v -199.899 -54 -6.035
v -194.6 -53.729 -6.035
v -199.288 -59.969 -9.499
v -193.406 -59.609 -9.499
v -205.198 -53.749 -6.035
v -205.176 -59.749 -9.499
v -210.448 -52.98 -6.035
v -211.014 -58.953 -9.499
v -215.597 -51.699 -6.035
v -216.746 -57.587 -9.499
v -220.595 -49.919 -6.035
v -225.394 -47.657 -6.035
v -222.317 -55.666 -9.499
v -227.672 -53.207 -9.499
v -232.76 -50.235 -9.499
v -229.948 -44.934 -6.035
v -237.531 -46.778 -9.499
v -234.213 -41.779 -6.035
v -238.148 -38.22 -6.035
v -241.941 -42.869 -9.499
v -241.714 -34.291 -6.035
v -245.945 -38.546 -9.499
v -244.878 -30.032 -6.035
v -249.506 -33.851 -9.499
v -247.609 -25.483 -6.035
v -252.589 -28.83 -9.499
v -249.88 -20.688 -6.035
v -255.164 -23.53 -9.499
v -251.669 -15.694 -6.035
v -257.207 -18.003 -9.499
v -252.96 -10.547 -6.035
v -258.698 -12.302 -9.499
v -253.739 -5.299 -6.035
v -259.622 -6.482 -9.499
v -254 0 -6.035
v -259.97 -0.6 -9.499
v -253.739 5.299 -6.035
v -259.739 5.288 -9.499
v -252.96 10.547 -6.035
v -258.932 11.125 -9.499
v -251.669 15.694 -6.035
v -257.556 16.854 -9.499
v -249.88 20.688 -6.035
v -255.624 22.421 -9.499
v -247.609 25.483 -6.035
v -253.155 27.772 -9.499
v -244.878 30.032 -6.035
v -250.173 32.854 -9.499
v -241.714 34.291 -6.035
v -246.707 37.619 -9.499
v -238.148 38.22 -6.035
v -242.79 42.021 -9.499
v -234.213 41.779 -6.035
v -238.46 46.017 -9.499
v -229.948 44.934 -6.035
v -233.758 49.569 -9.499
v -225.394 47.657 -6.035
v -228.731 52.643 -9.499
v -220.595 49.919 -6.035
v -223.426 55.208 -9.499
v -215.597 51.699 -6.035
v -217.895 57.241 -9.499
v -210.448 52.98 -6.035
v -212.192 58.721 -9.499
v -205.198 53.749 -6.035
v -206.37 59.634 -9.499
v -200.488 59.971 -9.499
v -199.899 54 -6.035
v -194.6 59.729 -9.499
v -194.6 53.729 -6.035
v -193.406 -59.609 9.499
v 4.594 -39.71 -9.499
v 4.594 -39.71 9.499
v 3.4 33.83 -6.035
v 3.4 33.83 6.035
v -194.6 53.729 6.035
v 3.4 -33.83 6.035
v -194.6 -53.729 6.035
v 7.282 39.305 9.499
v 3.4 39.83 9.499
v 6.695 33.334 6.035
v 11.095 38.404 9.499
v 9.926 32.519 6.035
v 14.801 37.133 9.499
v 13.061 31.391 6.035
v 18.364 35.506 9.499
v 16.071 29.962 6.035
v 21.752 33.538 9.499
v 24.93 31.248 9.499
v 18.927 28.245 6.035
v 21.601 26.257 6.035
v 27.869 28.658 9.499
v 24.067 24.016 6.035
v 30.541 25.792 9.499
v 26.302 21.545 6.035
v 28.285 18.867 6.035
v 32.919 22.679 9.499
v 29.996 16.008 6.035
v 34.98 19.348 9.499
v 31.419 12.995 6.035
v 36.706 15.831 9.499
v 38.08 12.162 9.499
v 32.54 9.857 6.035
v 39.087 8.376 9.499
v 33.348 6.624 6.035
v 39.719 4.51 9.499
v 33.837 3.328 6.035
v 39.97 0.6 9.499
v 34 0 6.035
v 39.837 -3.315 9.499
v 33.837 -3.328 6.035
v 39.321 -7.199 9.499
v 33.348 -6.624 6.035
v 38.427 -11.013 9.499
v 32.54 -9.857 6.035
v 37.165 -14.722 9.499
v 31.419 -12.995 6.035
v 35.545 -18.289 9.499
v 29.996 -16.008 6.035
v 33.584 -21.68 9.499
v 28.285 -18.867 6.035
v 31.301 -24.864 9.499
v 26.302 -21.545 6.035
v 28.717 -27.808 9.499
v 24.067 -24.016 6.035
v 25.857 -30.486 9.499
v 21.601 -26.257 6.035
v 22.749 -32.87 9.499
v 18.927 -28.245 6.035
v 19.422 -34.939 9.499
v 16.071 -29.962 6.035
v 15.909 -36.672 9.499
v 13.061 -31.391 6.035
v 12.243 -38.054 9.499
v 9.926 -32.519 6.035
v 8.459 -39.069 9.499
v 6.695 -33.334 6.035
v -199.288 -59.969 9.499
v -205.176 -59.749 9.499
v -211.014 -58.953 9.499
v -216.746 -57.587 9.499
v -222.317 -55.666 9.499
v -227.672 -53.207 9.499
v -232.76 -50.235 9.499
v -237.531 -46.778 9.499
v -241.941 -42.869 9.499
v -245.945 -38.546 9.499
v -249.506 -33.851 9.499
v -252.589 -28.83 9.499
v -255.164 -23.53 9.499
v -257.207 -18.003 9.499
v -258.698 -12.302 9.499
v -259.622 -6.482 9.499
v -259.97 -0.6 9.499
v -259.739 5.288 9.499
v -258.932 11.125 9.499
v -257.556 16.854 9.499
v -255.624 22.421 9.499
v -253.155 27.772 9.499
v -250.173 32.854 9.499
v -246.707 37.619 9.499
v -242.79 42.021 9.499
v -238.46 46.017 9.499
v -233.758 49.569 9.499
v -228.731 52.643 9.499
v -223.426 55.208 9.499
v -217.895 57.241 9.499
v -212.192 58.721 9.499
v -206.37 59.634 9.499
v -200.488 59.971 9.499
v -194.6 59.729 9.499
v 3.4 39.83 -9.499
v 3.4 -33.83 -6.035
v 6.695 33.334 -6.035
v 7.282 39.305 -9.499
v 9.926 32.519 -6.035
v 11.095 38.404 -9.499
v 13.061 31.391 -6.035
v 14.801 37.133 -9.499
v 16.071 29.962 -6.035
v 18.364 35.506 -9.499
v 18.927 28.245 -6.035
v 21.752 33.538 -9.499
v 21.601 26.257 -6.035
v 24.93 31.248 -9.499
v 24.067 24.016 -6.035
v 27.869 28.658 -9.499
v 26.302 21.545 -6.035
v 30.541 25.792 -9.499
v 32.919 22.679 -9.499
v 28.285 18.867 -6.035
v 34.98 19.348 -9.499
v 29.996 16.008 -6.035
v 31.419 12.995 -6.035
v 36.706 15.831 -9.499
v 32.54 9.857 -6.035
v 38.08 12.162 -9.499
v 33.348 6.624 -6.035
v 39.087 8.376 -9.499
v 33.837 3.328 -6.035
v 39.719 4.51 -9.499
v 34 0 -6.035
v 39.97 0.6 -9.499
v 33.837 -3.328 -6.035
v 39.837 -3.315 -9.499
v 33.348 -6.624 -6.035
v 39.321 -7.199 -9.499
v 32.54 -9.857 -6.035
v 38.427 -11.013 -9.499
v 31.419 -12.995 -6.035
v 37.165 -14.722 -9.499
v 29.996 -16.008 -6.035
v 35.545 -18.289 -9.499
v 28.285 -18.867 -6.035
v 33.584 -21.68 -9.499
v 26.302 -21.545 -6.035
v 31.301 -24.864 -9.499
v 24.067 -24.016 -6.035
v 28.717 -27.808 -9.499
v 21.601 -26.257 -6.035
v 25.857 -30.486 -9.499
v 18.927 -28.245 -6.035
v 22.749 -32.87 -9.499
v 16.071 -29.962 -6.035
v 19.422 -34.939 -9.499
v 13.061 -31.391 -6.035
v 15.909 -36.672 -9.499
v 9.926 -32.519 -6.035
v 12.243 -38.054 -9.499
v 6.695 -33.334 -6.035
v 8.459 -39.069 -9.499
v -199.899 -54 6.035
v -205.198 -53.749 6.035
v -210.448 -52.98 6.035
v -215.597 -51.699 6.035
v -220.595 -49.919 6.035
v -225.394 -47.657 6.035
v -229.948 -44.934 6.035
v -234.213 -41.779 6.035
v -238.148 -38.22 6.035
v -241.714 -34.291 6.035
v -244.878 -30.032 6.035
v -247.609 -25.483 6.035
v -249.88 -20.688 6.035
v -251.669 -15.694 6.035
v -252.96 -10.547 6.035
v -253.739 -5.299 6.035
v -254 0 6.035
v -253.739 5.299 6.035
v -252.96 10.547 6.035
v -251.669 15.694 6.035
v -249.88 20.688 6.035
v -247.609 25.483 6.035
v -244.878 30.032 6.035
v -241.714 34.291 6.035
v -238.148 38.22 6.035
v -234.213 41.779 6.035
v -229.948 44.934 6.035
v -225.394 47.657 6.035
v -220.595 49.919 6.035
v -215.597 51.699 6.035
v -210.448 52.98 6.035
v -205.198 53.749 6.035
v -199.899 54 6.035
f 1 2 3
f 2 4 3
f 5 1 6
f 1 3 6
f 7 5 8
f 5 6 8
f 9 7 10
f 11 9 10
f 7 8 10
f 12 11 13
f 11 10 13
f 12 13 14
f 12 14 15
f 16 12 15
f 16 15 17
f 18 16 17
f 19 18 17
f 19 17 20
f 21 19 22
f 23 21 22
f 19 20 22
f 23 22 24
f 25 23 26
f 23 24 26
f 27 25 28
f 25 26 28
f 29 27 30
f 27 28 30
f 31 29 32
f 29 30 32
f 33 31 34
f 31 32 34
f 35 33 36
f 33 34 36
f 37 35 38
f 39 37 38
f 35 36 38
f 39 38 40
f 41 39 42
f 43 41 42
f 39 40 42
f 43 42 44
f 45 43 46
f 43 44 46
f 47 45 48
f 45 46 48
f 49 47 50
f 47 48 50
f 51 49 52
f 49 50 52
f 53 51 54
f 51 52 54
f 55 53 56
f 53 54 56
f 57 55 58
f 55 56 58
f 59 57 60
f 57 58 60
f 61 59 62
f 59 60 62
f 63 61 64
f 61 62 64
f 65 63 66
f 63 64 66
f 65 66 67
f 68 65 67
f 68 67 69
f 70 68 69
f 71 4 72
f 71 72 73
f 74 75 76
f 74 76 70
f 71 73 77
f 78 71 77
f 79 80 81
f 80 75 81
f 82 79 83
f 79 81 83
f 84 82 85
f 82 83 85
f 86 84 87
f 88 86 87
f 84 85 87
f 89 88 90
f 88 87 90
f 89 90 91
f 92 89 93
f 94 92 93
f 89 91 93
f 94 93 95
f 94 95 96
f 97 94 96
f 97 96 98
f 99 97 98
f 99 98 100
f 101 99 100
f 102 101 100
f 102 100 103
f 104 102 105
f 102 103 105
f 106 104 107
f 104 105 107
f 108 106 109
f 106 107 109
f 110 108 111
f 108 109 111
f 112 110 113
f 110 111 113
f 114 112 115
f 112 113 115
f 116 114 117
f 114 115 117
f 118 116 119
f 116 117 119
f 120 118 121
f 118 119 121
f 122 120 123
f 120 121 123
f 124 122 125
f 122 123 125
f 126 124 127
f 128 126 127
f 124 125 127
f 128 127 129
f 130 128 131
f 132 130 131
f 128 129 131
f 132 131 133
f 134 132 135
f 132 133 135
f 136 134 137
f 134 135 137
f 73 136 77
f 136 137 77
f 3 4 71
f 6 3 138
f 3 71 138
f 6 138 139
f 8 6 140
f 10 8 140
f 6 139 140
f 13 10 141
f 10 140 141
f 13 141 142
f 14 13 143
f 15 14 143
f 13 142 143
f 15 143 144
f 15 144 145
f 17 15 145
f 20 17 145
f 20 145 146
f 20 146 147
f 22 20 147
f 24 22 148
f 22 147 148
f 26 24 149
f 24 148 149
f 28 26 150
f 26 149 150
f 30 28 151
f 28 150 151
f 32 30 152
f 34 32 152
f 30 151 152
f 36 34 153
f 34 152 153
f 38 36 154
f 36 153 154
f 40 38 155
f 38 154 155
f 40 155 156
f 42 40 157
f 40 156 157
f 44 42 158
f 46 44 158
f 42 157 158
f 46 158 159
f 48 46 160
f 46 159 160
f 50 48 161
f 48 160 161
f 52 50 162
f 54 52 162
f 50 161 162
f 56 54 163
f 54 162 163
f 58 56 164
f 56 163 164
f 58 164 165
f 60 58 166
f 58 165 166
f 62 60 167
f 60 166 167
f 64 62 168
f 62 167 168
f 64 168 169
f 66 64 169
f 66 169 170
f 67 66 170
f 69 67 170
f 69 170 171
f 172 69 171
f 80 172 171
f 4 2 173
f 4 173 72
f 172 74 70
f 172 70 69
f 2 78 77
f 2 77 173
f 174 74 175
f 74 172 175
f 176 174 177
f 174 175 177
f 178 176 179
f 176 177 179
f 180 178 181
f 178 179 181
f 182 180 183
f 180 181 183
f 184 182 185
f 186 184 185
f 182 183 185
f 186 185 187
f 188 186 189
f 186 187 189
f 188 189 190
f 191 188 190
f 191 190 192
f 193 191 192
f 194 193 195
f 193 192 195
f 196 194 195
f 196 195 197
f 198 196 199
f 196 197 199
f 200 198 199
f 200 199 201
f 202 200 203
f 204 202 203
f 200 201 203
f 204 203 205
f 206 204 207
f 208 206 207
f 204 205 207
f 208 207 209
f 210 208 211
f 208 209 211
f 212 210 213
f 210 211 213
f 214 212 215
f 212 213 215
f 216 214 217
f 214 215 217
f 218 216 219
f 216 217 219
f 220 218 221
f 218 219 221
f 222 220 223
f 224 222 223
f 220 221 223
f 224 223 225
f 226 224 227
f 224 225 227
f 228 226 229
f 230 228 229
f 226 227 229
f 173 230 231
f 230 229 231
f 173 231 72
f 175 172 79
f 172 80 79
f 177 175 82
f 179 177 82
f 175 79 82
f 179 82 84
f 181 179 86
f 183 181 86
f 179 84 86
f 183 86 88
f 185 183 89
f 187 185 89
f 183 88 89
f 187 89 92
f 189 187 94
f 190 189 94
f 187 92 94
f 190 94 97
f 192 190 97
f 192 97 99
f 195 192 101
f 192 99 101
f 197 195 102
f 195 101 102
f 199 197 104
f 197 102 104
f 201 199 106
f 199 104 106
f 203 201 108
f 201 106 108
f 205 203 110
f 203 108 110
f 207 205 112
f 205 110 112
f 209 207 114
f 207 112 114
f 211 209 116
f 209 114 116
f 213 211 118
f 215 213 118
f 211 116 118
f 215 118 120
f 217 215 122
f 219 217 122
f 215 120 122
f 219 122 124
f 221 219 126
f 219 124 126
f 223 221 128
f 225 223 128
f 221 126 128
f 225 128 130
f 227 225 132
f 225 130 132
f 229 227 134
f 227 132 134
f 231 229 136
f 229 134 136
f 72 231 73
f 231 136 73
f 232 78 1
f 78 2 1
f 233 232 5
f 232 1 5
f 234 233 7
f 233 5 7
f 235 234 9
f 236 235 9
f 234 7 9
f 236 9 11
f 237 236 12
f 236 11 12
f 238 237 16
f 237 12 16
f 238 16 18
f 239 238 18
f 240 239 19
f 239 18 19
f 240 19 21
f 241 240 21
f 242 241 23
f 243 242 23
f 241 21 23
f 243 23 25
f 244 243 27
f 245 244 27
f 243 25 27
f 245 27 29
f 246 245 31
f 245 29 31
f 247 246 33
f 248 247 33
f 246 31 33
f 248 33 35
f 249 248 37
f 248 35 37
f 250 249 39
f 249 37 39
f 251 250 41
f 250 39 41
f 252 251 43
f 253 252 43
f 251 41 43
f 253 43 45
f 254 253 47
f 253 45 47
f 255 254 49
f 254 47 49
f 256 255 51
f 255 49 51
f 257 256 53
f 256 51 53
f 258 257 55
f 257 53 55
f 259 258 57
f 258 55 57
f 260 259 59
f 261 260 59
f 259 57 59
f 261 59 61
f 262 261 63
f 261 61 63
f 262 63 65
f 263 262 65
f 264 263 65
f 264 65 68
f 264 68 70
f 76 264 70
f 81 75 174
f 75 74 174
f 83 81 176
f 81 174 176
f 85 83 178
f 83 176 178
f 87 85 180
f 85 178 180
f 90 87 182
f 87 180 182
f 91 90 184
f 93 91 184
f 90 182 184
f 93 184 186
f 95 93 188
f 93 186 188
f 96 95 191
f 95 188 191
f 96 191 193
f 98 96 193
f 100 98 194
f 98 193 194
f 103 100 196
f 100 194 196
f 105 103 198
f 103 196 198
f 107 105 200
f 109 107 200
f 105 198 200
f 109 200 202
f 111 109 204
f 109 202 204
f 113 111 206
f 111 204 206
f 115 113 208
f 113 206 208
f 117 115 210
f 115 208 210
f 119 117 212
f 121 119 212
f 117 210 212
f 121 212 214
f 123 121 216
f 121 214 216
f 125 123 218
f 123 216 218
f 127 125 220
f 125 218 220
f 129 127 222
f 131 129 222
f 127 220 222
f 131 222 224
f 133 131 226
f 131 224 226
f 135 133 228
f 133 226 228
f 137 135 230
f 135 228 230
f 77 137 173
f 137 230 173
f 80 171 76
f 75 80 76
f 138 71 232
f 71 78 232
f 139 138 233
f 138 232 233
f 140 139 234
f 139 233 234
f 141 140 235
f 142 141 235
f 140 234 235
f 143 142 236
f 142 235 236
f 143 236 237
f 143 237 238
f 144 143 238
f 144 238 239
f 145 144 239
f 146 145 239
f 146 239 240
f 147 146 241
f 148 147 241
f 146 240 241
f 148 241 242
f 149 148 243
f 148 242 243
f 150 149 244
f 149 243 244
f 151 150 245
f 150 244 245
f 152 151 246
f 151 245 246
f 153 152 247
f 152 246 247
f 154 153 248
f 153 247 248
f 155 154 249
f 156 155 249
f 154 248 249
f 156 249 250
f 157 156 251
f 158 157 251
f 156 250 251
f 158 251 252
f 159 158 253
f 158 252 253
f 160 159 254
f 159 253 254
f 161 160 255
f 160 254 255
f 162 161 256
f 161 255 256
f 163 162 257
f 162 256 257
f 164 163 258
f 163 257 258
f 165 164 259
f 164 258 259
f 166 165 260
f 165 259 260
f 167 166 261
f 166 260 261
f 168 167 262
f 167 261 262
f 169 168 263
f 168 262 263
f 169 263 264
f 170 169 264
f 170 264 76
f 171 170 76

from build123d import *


with BuildPart() as part:
    # Sweep1: sweep along a path in Sketch2
    with BuildLine(Plane.XY) as sweep1_path:
        Line((3.4, -33.829572862), (-194.6, -53.729321604))
        ThreePointArc((-194.6, -53.729321604), (-254, 0), (-194.6, 53.729321604))
        Line((-194.6, 53.729321604), (3.4, 33.829572862))
        ThreePointArc((3.4, 33.829572862), (34, 0), (3.4, -33.829572862))
    # Sketch4 → Sweep1 (sweep)
    with BuildSketch(Plane(origin=(0, 0, 0), x_dir=(0, 0, -1), z_dir=(1, 0, 0))):
        Polygon((0, 34.171285719), (6.035, 34.171285719), (9.499101615, 40.171285719), (-9.499101615, 40.171285719), (-6.035, 34.171285719), align=None)
    sweep(path=sweep1_path.line)


solid = part.part
